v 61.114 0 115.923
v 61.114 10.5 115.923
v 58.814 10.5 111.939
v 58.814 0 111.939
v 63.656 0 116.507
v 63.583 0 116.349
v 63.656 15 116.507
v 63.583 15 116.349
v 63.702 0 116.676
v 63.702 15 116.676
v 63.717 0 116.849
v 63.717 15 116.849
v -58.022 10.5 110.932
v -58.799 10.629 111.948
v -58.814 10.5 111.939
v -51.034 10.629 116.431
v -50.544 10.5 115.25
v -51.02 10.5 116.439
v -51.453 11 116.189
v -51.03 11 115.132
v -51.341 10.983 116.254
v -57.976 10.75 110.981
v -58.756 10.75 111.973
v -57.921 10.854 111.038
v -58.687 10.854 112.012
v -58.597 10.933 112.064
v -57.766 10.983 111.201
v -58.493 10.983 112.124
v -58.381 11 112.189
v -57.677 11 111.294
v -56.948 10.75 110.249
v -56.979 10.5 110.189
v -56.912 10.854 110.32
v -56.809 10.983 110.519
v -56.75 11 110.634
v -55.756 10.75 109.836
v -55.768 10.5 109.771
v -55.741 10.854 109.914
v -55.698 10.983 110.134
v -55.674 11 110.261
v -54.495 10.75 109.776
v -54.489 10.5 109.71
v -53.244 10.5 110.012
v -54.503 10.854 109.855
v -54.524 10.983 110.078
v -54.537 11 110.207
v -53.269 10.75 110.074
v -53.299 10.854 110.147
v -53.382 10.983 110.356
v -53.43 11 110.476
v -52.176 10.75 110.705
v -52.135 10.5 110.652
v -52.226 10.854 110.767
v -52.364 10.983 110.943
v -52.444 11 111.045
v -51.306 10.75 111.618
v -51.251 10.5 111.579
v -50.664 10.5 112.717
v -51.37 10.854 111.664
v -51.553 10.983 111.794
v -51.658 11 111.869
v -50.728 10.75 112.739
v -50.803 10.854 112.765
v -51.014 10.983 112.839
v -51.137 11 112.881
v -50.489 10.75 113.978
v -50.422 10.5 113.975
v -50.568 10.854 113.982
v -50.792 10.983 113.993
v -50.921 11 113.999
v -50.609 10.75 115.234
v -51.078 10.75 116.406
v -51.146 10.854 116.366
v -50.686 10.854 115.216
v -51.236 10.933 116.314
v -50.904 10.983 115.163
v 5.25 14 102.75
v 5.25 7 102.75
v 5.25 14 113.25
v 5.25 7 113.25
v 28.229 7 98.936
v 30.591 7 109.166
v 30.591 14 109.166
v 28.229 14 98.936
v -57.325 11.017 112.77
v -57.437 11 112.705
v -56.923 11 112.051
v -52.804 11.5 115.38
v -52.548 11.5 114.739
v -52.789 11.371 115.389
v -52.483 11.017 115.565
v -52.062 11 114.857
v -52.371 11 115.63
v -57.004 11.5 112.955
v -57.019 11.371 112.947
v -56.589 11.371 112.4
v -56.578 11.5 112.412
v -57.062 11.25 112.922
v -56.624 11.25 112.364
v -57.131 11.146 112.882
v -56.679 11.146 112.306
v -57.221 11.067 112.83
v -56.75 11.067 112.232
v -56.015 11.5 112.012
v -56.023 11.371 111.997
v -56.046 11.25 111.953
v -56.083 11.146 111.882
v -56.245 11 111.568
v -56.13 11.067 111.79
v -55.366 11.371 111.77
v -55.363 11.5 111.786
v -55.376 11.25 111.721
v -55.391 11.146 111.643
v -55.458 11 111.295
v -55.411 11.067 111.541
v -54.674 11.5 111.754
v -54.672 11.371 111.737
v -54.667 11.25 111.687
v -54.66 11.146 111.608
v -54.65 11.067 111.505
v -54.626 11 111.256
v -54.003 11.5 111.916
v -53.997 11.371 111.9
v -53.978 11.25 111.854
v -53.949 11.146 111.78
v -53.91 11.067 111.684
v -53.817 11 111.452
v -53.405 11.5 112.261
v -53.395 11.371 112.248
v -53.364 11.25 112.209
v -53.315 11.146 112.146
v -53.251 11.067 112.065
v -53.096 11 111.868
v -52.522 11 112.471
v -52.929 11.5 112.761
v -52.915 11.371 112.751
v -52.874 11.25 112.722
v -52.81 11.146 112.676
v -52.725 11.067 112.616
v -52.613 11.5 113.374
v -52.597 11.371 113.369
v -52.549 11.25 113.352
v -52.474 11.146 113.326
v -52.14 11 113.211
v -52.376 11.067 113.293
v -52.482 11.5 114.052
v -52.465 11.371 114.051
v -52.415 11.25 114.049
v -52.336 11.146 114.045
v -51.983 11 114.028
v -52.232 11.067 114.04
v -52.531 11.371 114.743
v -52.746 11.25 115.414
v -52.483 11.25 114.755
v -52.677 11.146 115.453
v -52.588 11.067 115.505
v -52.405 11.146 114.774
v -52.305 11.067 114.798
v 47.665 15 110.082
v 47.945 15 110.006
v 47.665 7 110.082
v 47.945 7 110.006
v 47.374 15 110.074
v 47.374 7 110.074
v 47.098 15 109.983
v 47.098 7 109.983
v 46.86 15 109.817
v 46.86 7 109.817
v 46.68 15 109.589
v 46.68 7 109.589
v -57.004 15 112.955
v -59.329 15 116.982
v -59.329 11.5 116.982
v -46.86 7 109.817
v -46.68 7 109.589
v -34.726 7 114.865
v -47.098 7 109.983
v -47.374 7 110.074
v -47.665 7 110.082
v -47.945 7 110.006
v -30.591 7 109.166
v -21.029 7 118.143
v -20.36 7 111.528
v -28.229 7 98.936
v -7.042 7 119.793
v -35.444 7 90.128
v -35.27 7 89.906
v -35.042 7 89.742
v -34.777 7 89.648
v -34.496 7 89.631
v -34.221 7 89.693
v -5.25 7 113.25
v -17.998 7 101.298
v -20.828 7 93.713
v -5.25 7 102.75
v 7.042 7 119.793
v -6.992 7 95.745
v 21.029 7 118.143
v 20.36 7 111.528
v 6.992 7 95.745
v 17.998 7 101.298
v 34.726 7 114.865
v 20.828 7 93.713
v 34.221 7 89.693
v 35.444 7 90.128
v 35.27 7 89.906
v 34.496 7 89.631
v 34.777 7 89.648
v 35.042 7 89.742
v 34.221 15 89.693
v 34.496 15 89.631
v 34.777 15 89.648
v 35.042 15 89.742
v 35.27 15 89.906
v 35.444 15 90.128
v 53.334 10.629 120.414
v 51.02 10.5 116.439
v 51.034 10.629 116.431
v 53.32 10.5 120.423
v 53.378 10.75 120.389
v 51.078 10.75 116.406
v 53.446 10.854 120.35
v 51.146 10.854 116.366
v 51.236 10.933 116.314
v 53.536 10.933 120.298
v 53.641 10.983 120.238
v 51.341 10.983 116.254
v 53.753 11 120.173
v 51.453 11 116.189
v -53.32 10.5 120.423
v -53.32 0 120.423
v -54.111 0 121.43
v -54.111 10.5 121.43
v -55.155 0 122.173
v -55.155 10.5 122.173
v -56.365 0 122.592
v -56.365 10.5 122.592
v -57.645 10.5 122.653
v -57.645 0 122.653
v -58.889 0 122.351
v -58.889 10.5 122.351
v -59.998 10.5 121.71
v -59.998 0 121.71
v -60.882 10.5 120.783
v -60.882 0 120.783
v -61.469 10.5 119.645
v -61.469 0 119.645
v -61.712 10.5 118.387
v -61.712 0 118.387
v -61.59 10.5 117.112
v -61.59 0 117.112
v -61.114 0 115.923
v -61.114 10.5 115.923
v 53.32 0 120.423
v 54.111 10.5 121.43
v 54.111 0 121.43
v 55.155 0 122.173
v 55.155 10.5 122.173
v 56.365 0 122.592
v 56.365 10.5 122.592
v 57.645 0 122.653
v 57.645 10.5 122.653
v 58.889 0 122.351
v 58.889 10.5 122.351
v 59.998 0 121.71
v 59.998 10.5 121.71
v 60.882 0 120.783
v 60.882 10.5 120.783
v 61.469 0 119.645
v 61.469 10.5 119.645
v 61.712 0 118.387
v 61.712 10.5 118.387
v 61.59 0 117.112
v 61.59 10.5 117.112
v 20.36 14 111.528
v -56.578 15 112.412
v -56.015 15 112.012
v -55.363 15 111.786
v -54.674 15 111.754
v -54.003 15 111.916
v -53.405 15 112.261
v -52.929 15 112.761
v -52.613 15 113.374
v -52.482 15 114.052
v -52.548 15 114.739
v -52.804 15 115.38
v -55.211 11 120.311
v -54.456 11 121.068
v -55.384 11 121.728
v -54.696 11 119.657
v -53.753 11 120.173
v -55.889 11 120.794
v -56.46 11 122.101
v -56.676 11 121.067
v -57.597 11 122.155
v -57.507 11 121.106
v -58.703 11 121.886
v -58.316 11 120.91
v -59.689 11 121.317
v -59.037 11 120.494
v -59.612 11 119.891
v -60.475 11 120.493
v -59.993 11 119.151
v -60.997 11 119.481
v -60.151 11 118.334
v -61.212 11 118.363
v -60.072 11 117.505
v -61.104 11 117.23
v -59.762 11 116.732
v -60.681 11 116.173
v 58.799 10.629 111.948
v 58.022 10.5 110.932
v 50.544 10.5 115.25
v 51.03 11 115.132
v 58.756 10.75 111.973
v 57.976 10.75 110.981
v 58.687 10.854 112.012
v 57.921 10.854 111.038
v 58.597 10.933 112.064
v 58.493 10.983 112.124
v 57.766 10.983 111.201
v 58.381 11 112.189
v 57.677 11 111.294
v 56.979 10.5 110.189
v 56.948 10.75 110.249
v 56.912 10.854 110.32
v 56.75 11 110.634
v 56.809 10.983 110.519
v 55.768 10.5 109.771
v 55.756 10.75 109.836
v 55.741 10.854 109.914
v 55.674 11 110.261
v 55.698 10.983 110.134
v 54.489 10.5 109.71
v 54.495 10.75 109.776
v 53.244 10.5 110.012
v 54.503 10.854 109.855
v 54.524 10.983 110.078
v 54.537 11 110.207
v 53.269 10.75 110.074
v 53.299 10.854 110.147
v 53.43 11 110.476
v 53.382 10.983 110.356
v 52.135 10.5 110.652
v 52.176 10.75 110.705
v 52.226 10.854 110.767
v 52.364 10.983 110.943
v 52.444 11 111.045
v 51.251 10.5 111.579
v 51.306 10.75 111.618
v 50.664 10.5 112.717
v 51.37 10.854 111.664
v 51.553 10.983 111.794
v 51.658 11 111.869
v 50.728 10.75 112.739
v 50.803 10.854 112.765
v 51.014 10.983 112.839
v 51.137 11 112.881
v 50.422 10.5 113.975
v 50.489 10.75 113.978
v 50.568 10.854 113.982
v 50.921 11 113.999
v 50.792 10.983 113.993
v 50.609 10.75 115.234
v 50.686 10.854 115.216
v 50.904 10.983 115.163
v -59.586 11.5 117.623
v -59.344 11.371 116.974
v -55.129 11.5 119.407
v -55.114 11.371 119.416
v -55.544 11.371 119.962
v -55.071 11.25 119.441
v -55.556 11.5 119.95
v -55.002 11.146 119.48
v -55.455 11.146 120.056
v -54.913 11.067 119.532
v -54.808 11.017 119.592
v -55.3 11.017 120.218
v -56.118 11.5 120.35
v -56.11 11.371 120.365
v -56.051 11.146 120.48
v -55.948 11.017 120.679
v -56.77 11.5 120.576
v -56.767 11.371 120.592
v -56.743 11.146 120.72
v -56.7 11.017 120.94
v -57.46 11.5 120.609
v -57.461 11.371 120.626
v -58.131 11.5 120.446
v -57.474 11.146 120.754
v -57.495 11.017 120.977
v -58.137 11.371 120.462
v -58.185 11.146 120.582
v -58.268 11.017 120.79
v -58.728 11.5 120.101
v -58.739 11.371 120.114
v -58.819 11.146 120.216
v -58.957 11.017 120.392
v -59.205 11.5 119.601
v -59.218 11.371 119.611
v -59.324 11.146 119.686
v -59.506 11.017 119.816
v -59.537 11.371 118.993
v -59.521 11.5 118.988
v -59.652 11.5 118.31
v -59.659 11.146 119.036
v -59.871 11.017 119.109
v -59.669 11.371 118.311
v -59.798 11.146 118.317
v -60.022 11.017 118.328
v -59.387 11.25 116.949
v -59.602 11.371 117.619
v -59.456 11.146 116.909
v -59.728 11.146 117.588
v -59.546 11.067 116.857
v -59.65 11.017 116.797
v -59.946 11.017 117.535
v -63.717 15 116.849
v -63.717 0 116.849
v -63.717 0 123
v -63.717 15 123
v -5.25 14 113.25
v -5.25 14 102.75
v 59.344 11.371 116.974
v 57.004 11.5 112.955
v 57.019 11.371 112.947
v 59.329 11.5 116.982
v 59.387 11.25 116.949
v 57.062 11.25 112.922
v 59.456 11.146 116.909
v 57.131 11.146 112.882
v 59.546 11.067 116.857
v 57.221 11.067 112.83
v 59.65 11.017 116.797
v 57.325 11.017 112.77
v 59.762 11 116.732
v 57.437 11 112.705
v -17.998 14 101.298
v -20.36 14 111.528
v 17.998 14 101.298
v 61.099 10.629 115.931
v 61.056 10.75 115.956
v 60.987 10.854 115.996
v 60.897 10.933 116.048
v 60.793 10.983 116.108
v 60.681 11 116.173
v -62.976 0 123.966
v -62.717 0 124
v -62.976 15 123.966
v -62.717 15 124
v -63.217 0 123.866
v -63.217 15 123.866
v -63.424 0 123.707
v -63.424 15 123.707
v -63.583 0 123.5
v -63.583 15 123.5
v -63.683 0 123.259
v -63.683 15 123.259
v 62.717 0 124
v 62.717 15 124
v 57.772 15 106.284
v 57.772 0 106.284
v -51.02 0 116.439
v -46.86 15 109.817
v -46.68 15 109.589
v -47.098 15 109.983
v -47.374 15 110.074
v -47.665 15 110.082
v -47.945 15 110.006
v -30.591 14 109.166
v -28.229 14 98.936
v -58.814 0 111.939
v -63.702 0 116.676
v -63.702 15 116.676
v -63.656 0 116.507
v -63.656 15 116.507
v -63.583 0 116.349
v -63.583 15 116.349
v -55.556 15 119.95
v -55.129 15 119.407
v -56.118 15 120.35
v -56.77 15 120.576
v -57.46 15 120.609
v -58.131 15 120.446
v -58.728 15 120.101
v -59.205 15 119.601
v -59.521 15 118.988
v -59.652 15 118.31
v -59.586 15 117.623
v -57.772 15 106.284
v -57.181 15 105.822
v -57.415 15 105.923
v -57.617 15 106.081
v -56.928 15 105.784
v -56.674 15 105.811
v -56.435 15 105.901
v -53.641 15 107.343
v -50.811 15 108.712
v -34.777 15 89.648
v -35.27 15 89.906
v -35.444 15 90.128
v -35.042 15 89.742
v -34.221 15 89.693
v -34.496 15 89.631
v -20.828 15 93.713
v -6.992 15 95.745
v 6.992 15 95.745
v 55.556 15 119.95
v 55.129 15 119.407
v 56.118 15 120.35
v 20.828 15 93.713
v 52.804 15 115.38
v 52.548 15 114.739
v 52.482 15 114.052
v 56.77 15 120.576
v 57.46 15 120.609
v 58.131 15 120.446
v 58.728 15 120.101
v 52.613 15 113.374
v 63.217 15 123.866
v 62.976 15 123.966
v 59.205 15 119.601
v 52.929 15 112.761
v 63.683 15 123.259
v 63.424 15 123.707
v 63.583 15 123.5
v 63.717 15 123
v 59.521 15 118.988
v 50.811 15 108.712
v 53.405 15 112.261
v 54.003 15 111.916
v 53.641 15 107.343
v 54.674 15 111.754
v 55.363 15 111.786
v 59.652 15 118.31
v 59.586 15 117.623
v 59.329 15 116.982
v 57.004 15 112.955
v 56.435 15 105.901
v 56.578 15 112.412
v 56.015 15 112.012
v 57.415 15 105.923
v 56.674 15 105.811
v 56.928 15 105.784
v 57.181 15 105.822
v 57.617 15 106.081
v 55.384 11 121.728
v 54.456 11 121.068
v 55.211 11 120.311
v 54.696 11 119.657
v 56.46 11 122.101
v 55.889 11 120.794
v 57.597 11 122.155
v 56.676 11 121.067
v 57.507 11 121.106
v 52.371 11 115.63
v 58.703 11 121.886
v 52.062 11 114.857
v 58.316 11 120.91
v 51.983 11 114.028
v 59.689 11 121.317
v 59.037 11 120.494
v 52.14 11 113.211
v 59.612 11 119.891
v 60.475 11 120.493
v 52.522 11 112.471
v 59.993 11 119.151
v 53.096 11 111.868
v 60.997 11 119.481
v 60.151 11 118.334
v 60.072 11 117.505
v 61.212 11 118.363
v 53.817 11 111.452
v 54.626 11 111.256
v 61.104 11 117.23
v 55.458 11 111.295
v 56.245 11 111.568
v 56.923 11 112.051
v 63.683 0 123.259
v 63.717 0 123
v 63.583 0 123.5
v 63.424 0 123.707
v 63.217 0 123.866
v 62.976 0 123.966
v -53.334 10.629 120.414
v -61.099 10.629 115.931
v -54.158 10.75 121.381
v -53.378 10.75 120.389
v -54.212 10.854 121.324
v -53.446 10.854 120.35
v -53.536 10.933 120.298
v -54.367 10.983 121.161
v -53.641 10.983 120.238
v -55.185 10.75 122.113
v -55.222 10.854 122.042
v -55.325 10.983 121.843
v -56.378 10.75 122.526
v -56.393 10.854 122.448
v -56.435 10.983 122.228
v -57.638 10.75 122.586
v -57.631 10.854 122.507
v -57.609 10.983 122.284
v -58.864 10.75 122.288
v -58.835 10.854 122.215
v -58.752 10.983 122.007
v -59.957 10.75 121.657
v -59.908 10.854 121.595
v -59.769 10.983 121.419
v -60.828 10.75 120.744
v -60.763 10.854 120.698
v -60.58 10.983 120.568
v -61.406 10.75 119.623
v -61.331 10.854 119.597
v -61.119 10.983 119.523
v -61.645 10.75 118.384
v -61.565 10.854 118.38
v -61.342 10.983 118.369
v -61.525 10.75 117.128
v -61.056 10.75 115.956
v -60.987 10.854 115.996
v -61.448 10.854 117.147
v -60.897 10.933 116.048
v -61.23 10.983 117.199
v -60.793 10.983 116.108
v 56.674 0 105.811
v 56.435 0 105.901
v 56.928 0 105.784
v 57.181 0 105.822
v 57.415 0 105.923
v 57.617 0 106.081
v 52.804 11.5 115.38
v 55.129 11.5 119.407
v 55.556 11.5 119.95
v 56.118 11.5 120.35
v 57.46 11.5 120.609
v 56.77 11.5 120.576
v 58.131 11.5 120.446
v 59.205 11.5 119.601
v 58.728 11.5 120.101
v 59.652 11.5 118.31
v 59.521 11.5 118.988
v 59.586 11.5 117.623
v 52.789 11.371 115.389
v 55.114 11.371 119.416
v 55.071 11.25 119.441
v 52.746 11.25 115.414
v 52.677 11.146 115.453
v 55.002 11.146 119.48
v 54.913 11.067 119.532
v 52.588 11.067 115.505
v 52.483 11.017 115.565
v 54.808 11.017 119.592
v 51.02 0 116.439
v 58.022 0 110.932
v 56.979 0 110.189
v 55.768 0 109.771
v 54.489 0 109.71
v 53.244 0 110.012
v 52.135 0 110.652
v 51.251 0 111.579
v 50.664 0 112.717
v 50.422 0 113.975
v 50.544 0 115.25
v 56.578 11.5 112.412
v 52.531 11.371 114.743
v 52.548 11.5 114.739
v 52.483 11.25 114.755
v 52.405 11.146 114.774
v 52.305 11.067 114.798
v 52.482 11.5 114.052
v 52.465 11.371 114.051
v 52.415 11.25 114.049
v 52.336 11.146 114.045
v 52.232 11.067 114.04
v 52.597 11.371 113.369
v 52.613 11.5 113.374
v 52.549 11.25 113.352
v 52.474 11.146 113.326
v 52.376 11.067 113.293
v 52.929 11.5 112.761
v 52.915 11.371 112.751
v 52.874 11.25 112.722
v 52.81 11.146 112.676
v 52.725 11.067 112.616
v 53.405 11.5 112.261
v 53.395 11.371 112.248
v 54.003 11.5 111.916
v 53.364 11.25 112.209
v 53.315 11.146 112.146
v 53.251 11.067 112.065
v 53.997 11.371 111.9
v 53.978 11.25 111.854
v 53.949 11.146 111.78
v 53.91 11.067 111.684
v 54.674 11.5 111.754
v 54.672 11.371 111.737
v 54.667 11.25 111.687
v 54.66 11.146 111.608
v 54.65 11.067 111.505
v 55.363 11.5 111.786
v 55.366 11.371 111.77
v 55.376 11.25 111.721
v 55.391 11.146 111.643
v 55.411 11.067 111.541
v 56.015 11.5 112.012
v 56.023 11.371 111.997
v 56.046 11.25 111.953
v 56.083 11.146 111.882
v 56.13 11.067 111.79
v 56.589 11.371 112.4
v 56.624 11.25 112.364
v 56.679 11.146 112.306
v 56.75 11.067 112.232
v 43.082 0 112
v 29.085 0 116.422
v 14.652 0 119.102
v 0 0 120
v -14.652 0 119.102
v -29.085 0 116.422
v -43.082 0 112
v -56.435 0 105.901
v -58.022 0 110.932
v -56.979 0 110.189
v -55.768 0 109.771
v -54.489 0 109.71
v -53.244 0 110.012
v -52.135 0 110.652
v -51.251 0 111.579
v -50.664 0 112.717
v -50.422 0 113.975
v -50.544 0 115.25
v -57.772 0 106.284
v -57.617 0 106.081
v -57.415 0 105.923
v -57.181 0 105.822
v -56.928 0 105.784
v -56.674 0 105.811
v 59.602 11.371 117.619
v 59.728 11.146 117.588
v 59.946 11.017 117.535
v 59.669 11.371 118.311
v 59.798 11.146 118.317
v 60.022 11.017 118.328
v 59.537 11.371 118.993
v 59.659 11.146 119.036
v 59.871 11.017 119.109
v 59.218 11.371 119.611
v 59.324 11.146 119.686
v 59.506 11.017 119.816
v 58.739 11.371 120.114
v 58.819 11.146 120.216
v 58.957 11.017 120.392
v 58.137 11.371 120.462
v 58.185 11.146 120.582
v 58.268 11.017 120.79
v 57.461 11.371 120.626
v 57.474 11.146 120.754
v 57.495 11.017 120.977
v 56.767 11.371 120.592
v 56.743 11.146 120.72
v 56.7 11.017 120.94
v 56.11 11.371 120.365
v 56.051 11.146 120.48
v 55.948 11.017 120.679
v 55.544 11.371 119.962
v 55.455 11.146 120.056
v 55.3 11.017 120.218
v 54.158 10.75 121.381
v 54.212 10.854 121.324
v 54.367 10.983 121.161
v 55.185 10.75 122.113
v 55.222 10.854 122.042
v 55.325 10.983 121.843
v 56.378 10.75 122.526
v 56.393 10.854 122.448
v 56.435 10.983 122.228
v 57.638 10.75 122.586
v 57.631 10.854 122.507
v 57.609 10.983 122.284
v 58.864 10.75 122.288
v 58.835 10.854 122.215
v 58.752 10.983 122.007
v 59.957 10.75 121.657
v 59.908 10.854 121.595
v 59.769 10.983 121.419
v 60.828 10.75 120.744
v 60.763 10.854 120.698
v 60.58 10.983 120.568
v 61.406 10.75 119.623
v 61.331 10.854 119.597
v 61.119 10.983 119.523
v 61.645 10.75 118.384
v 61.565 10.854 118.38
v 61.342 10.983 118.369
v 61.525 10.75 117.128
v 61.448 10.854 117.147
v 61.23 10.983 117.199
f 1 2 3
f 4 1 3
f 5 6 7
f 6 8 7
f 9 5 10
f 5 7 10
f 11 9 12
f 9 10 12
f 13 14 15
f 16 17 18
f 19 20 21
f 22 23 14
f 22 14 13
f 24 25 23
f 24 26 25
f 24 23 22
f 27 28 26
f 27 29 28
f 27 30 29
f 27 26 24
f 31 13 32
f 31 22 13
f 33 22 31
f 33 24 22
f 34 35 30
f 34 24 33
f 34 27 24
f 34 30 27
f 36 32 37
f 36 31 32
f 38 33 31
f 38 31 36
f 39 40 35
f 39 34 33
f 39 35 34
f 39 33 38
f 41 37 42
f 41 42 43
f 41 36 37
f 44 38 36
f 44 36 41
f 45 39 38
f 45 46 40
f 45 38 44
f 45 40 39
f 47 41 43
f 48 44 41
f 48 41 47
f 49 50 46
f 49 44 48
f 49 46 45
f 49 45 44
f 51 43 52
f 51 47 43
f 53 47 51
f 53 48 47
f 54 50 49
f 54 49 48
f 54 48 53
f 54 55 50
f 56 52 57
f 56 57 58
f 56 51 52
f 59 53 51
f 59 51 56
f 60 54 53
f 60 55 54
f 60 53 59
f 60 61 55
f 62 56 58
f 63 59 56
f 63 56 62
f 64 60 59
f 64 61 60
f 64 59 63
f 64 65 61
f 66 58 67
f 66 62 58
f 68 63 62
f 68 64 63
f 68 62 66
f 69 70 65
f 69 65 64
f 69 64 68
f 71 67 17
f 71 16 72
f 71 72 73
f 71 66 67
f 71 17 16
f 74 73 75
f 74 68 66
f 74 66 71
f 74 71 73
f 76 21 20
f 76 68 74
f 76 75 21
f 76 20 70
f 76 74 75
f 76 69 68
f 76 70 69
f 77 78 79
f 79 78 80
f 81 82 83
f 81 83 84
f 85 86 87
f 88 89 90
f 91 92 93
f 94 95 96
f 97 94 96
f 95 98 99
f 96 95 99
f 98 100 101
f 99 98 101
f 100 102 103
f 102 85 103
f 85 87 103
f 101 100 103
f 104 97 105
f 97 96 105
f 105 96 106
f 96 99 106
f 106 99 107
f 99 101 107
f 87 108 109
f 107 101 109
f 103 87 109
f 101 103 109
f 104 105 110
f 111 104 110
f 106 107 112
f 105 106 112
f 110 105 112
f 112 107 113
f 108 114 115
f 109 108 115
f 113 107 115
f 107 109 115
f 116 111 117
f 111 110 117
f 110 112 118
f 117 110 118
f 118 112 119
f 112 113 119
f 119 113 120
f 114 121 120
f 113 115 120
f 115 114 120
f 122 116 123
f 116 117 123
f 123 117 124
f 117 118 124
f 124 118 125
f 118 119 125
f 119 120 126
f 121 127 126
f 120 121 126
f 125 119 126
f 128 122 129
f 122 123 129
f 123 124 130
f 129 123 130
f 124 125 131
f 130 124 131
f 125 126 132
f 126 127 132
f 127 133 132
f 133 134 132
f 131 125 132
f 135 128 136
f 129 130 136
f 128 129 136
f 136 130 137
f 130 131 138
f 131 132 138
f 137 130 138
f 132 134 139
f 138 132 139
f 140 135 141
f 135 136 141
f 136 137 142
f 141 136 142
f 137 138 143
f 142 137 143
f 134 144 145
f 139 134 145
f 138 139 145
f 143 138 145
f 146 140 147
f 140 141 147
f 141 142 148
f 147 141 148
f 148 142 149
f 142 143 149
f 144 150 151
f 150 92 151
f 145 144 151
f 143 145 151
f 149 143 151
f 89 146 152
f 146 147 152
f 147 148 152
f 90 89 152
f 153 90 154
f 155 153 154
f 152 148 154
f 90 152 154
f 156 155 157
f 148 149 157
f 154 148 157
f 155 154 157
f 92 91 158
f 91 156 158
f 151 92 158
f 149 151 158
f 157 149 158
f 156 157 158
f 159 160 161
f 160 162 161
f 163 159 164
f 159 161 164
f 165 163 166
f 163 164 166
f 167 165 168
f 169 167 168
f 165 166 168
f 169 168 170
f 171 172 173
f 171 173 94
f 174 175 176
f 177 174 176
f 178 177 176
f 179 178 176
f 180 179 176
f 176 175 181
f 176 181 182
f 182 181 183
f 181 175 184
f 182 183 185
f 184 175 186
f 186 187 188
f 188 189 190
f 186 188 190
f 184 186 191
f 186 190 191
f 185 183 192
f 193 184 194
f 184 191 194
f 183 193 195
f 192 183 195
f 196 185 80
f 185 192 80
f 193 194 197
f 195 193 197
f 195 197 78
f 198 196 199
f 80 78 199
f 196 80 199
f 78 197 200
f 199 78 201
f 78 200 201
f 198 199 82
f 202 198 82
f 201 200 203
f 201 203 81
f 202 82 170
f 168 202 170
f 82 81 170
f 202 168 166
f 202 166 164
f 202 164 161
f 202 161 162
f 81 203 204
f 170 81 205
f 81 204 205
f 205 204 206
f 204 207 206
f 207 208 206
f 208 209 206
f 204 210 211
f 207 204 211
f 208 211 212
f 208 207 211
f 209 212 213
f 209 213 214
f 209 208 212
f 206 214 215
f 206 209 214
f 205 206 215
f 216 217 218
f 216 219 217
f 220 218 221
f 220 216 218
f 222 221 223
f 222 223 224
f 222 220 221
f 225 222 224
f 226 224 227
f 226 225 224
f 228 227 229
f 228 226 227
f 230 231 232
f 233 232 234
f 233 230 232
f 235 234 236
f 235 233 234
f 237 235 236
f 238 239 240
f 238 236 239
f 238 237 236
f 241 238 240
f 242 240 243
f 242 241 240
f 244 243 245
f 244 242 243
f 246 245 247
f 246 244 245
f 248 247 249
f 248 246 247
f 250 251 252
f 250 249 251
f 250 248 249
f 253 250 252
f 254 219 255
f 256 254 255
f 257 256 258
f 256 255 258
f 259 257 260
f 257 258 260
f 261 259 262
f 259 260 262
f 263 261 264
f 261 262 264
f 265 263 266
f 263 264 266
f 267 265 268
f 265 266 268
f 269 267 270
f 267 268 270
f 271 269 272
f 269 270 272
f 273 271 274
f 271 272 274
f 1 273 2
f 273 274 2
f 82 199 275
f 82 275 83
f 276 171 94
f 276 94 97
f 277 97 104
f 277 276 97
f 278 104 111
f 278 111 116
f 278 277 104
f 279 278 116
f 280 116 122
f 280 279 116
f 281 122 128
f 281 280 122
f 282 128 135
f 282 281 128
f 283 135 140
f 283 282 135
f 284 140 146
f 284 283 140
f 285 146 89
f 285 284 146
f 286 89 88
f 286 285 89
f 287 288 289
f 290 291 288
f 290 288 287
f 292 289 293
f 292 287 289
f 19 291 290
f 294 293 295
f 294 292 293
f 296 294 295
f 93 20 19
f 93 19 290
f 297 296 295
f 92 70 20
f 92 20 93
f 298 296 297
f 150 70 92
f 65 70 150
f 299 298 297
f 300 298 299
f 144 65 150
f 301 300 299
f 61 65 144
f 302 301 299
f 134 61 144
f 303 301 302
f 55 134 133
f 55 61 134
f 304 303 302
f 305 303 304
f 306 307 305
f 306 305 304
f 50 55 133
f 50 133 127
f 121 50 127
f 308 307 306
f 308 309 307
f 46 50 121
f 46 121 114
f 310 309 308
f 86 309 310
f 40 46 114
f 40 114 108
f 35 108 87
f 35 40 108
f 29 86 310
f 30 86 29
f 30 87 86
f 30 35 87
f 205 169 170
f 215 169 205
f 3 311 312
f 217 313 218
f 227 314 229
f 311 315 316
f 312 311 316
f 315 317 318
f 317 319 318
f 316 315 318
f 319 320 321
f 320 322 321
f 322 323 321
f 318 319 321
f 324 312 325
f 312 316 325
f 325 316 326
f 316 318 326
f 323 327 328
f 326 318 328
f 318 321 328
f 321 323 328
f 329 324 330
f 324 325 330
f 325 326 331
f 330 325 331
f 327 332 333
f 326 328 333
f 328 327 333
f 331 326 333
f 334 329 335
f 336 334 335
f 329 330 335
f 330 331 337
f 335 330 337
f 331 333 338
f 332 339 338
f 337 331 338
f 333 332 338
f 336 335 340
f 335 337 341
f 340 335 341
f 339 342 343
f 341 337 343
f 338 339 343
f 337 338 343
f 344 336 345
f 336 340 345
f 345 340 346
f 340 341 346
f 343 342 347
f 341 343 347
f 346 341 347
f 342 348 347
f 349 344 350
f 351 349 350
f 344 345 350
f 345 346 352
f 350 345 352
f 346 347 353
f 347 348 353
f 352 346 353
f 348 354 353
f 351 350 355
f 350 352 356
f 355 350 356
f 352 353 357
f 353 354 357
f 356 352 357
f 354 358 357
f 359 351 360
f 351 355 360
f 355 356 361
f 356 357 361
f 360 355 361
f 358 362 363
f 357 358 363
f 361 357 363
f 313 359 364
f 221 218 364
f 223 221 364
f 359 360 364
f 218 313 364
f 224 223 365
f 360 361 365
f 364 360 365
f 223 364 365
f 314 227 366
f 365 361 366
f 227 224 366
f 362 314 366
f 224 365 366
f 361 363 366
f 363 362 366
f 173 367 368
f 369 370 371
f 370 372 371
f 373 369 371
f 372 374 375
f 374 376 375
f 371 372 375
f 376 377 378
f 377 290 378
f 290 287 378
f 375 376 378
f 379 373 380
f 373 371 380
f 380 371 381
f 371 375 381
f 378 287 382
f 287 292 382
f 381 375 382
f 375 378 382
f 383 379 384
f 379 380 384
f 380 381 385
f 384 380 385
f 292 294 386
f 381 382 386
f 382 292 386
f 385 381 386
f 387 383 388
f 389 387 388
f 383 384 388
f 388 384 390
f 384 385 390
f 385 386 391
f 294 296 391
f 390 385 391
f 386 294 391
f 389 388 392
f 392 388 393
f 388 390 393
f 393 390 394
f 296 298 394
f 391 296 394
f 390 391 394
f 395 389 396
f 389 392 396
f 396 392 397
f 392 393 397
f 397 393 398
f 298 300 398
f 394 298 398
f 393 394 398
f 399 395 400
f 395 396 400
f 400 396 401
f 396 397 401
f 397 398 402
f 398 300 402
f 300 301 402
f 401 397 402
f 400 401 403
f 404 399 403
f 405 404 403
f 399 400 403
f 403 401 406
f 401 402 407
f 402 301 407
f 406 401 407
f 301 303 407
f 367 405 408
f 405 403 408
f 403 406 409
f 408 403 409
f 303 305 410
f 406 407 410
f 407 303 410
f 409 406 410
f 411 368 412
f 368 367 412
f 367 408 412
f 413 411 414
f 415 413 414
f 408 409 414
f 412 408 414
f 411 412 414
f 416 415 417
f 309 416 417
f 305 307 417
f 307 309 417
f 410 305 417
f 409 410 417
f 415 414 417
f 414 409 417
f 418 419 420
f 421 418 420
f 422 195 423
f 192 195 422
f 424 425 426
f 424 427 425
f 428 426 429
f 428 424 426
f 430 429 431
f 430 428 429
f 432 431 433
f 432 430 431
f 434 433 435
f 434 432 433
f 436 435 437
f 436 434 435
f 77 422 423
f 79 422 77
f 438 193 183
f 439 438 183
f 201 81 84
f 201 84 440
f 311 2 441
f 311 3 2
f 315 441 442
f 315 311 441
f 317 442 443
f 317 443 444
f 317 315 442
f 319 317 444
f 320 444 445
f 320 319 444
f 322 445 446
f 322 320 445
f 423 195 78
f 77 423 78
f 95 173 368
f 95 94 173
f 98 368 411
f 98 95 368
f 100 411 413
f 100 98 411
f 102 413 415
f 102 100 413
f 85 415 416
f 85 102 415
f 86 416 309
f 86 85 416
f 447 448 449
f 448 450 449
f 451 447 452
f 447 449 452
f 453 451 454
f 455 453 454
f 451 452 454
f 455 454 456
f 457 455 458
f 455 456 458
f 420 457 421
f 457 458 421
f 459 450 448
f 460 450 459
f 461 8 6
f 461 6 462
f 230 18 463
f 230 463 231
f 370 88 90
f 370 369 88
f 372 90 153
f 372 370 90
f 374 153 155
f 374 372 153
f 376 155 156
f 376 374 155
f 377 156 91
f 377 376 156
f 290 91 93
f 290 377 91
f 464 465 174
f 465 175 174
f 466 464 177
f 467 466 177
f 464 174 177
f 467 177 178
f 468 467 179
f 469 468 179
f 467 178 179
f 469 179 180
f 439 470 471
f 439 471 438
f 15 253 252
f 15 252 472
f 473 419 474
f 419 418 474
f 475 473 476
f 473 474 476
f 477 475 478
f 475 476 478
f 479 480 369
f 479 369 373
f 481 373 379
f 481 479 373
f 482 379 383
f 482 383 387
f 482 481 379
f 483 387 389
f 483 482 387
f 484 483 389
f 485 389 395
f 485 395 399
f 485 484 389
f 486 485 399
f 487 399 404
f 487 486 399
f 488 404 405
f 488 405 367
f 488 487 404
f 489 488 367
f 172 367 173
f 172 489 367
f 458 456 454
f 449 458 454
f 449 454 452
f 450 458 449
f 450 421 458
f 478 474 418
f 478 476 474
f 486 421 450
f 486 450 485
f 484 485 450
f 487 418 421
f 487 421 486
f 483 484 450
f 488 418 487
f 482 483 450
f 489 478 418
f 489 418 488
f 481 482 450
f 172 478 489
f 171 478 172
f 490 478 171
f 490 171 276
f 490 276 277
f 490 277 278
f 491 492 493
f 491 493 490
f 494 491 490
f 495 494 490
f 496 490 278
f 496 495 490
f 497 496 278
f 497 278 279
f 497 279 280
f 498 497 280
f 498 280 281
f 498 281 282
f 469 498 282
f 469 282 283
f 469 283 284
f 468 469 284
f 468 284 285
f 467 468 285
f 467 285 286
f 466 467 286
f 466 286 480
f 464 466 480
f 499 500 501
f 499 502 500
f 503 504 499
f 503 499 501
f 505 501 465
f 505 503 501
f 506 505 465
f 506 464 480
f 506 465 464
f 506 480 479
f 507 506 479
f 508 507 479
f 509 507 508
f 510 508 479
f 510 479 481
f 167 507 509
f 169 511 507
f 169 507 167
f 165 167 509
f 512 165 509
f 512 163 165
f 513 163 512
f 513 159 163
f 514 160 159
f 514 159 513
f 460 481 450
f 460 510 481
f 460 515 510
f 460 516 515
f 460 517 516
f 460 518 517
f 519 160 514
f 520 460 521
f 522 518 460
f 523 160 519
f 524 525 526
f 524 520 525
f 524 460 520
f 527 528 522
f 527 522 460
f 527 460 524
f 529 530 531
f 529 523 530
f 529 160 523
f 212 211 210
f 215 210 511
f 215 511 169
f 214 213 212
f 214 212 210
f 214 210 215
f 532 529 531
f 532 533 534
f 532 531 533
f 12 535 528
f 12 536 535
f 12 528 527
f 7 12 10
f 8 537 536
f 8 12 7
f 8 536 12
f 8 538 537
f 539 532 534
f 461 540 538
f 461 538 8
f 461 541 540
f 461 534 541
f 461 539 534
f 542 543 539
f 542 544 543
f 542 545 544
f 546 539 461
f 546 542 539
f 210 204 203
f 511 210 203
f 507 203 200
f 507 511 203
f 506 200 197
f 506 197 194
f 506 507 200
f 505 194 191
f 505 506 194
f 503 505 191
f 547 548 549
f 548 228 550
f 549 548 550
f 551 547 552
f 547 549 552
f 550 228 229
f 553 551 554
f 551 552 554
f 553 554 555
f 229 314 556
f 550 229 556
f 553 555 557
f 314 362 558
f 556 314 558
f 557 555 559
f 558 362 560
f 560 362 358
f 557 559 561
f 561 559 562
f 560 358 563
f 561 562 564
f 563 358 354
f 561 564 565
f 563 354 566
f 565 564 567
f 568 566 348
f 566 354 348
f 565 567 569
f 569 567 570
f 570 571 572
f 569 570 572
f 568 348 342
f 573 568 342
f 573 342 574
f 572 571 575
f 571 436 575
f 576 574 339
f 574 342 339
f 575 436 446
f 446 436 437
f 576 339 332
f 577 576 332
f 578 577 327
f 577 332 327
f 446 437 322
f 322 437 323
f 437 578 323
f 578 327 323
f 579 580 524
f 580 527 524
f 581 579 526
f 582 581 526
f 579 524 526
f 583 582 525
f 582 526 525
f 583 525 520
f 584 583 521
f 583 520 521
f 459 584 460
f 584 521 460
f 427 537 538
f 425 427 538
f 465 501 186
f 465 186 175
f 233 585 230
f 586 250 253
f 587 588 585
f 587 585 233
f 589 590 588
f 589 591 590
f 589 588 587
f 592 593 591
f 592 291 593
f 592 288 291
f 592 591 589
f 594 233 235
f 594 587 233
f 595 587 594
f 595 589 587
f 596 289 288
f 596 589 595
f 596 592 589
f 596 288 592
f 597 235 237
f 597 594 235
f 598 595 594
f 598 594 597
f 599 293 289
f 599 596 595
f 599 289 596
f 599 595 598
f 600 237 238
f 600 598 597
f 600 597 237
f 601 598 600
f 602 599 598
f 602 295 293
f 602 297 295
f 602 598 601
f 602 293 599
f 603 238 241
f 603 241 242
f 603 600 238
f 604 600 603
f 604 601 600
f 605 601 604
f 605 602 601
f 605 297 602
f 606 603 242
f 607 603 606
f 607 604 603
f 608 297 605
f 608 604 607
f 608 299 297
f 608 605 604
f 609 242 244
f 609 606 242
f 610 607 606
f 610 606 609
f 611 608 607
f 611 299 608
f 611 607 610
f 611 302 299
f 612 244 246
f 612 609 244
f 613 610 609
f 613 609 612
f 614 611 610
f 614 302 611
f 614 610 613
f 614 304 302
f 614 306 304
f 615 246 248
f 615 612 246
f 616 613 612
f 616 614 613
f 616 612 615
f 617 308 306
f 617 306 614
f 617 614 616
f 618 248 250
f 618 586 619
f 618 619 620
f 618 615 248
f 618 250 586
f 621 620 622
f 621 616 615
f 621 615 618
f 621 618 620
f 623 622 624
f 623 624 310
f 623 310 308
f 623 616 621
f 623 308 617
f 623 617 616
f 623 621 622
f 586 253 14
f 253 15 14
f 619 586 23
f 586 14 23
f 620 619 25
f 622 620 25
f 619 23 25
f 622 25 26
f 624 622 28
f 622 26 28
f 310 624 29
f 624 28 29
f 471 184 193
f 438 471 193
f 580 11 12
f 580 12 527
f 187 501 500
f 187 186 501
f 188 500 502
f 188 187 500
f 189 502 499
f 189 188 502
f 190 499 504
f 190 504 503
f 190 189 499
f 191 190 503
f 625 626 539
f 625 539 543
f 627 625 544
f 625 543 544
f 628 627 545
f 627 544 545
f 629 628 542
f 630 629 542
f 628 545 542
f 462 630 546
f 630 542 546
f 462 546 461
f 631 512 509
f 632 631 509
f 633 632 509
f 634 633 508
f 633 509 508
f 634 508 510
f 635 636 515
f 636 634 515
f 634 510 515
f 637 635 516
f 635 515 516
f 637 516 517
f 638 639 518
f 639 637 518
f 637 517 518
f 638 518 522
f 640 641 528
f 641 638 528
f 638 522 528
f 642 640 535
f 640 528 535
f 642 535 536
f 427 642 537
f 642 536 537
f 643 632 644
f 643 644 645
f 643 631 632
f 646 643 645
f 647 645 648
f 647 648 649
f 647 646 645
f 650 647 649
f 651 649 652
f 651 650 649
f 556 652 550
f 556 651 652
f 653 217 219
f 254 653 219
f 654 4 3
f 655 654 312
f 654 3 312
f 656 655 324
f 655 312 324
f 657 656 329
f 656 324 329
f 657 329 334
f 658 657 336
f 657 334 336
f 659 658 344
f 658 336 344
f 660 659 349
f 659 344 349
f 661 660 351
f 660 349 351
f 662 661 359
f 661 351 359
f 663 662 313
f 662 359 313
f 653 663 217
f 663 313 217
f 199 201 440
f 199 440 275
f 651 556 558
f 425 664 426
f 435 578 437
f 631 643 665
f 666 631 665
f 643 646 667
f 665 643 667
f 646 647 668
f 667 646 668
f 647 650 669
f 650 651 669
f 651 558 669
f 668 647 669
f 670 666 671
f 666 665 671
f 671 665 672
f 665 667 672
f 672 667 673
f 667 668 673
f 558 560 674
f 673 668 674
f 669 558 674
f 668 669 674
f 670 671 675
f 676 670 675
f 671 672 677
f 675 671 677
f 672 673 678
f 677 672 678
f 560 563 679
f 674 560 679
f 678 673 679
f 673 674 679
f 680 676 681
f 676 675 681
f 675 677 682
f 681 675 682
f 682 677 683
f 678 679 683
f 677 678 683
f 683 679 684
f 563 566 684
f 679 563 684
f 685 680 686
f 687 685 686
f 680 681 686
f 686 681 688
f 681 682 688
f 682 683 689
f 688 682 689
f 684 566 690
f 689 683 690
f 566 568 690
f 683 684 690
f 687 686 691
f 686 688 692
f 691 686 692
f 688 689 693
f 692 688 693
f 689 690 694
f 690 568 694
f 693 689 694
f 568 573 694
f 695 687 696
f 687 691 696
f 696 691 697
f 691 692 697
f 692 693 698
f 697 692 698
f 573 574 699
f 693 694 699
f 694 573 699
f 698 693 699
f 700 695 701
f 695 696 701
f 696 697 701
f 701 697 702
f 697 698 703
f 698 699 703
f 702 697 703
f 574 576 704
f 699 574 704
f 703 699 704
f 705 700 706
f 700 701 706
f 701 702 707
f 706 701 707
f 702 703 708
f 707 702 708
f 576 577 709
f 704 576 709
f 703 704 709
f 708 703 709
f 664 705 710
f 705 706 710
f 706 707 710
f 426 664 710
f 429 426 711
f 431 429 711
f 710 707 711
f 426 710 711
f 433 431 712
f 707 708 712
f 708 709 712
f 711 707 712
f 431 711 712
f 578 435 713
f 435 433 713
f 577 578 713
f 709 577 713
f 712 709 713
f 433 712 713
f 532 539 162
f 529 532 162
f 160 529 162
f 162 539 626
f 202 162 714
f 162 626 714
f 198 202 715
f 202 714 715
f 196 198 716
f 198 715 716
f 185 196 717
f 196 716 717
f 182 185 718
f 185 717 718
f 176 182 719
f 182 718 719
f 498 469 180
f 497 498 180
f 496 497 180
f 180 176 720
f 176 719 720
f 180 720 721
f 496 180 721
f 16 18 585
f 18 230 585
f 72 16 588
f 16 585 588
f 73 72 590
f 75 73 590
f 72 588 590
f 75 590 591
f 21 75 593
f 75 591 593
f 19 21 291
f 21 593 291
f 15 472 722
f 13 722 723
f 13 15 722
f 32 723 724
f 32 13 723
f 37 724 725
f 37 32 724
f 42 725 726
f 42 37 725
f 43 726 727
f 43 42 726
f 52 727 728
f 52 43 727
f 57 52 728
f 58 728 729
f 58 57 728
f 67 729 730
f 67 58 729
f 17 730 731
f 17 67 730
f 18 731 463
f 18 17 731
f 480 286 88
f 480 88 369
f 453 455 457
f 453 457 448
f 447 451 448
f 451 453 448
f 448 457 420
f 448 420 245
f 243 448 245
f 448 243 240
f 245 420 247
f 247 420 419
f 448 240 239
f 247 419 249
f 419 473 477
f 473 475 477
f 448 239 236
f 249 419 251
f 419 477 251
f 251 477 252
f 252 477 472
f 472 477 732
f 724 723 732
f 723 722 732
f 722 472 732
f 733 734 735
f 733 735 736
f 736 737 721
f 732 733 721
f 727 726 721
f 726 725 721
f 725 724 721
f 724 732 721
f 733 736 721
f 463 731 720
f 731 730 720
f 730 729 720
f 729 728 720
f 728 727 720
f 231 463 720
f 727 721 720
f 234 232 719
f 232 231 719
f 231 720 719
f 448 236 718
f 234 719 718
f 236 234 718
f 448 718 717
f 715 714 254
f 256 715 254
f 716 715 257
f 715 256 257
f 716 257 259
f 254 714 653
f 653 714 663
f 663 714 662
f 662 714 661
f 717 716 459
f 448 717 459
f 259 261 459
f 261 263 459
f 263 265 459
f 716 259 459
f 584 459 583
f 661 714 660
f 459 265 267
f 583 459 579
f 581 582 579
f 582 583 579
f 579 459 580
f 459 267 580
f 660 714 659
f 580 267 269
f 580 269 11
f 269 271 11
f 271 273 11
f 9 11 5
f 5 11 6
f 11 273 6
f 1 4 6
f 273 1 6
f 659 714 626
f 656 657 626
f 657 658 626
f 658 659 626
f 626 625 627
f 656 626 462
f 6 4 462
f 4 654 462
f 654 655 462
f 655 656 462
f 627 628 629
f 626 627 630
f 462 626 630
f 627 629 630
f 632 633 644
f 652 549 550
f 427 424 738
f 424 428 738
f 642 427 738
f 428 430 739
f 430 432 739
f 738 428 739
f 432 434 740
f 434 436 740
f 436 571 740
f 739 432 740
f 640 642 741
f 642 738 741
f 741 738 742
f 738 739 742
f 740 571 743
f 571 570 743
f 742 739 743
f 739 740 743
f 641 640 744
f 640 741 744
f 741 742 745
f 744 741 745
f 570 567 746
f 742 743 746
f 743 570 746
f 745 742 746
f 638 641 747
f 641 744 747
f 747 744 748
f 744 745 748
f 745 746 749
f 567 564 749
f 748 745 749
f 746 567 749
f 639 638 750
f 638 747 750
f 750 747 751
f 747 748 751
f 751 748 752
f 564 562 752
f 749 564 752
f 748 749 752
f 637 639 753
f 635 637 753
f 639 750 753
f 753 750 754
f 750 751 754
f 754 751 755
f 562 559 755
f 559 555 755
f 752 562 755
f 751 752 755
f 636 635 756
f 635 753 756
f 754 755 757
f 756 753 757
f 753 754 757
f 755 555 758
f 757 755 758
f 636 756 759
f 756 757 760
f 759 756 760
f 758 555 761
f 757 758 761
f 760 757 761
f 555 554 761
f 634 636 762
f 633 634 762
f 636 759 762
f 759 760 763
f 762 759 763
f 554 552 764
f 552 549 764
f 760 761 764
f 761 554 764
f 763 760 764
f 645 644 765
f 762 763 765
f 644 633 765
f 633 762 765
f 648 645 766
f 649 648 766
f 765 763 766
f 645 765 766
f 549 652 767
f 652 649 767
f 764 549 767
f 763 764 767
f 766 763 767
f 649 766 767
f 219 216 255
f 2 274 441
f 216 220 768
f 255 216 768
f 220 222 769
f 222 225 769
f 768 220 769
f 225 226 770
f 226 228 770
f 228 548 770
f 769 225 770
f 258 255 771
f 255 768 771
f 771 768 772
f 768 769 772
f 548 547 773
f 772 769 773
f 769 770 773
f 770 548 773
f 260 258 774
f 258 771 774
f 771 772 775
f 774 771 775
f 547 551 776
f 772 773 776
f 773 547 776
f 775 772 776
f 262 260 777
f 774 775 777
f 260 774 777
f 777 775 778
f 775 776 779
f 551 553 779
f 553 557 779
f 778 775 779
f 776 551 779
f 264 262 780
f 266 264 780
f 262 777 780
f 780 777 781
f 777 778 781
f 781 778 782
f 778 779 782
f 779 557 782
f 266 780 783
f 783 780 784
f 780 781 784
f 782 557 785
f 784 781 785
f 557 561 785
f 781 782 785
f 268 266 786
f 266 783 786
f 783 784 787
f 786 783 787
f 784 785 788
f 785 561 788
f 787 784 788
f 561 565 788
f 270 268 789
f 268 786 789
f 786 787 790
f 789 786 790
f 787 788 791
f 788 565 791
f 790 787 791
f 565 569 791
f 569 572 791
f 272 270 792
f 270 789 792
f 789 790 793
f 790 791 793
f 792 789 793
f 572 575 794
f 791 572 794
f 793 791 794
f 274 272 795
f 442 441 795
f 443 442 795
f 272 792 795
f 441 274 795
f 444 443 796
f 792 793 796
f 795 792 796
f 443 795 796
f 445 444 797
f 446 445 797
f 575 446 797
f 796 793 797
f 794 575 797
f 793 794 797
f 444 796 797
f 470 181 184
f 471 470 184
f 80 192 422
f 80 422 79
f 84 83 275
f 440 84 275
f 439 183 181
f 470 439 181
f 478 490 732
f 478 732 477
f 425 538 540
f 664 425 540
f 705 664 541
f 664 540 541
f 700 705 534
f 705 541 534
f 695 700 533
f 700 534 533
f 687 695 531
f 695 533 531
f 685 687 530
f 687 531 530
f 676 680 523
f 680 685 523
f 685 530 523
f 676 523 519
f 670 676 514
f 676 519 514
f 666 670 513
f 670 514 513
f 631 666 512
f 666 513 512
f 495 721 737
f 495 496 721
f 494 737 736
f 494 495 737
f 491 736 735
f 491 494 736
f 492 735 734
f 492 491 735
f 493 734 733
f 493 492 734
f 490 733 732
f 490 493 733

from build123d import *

# Parameters (mm, degrees)
BOSS_EXTRUDE1_DEPTH = 15
CUT_EXTRUDE1_DEPTH  = 16
CUT_EXTRUDE3_START  = -4
CUT_EXTRUDE3_DEPTH  = 12
FILLET2_R           = 0.5
BOSS_EXTRUDE2_DEPTH = 8
SKETCH5_W           = 10.5
SKETCH5_H           = 10.5
CUT_EXTRUDE4_DEPTH  = 7
CUT_EXTRUDE5_DEPTH  = 16
FILLET1_R           = 1


with BuildPart() as part:
    # Sketch1 → Boss-Extrude1 (new body)
    with BuildSketch(Plane(origin=(0, 0, 0), x_dir=(1, 0, 0), z_dir=(0, 1, 0))):
        with BuildLine():
            Line((-57.286267839, -105.443271559), (-68, -124))
            Line((-68, -124), (68, -124))
            Line((68, -124), (57.286267839, -105.443271559))
            ThreePointArc((57.286267839, -105.443271559), (0, -120), (-57.286267839, -105.443271559))
        make_face()
    extrude(amount=BOSS_EXTRUDE1_DEPTH)

    # Sketch2 → Cut-Extrude1 (cut, through all)
    with BuildSketch(Plane(origin=(0, 15, 0), x_dir=(1, 0, 0), z_dir=(0, 1, 0))):
        with BuildLine():
            Line((-52.804159001, -115.380031326), (-55.129159001, -119.407049454))
            ThreePointArc((-55.129159001, -119.407049454), (-58.441770605, -120.294661058), (-59.32938221, -116.982049454))
            Line((-59.32938221, -116.982049454), (-57.00438221, -112.955031326))
            ThreePointArc((-57.00438221, -112.955031326), (-53.691770605, -112.067419722), (-52.804159001, -115.380031326))
        make_face()
        with BuildLine():
            Line((52.804159001, -115.380031326), (55.129159001, -119.407049454))
            ThreePointArc((55.129159001, -119.407049454), (58.441770605, -120.294661058), (59.32938221, -116.982049454))
            Line((59.32938221, -116.982049454), (57.00438221, -112.955031326))
            ThreePointArc((57.00438221, -112.955031326), (53.691770605, -112.067419722), (52.804159001, -115.380031326))
        make_face()
    extrude(amount=-CUT_EXTRUDE1_DEPTH, mode=Mode.SUBTRACT)

    # Sketch3 → Cut-Extrude3 (cut, through all)
    with BuildSketch(Plane(origin=(0, 15, 0), x_dir=(1, 0, 0), z_dir=(0, 1, 0)).offset(CUT_EXTRUDE3_START)):
        with BuildLine():
            Line((-51.019656288, -116.439181962), (-53.319656288, -120.422898819))
            ThreePointArc((-53.319656288, -120.422898819), (-59.466770605, -122.070013136), (-61.113884922, -115.922898819))
            Line((-61.113884922, -115.922898819), (-58.813884922, -111.939181962))
            ThreePointArc((-58.813884922, -111.939181962), (-52.666770605, -110.292067644), (-51.019656288, -116.439181962))
        make_face()
        with BuildLine():
            Line((51.019656288, -116.439181962), (53.319656288, -120.422898819))
            ThreePointArc((53.319656288, -120.422898819), (59.466770605, -122.070013136), (61.113884922, -115.922898819))
            Line((61.113884922, -115.922898819), (58.813884922, -111.939181962))
            ThreePointArc((58.813884922, -111.939181962), (52.666770605, -110.292067644), (51.019656288, -116.439181962))
        make_face()
    extrude(amount=-CUT_EXTRUDE3_DEPTH, mode=Mode.SUBTRACT)

    # Fillet2
    fillet2_edges = [part.edges().sort_by_distance(p)[0] for p in [
        (-58.16688221, 11, 114.96854039),
        (53.966659001, 11, 117.39354039),
        (-52.666770605, 11, 110.292067644),
        (-59.963884922, 11, 113.93104039),
        (-59.466770605, 11, 122.070013136),
        (-52.169656288, 11, 118.43104039),
        (-53.691770605, 11, 112.067419722),
        (-53.966659001, 11, 117.39354039),
        (-58.441770605, 11, 120.294661058),
        (52.666770605, 11, 110.292067644),
        (52.169656288, 11, 118.43104039),
        (59.466770605, 11, 122.070013136),
        (59.963884922, 11, 113.93104039),
        (58.16688221, 11, 114.96854039),
        (53.691770605, 11, 112.067419722),
        (58.441770605, 11, 120.294661058),
    ]]
    fillet(fillet2_edges, radius=FILLET2_R)

    # Sketch4 → Boss-Extrude2 (add)
    with BuildSketch(Plane(origin=(0, 15, 0), x_dir=(1, 0, 0), z_dir=(0, 1, 0))):
        with BuildLine():
            Line((-35.015731887, -89.386232276), (-55, -124))
            Line((-55, -124), (55, -124))
            Line((55, -124), (35.015731887, -89.386232276))
            ThreePointArc((35.015731887, -89.386232276), (0, -96), (-35.015731887, -89.386232276))
        make_face()
    extrude(amount=-BOSS_EXTRUDE2_DEPTH)

    # Sketch5 → Cut-Extrude4 (cut)
    with BuildSketch(Plane.XZ.offset(-7)):
        with Locations((0, 108)):
            Rectangle(SKETCH5_W, SKETCH5_H)
        Polygon((17.998277994, 101.297517192), (20.360264064, 111.528402872), (30.591149745, 109.166416802), (28.229163674, 98.935531121), align=None)
        Polygon((-17.998277994, 101.297517192), (-20.360264064, 111.528402872), (-30.591149745, 109.166416802), (-28.229163674, 98.935531121), align=None)
    extrude(amount=-CUT_EXTRUDE4_DEPTH, mode=Mode.SUBTRACT)

    # Sketch6 → Cut-Extrude5 (cut, through all)
    with BuildSketch(Plane.XZ):
        Polygon((63.716770605, 116.581229068), (63.716770605, 124), (68, 124), align=None)
        Polygon((-68, 124), (-63.716770605, 116.581229068), (-63.716770605, 124), align=None)
    extrude(amount=-CUT_EXTRUDE5_DEPTH, mode=Mode.SUBTRACT)

    # Fillet1
    fillet1_edges = [part.edges().sort_by_distance(p)[0] for p in [
        (35.015731887, 11, 89.386232276),
        (-35.015731887, 11, 89.386232276),
        (47.124753912, 11, 110.359673653),
        (-47.124753912, 11, 110.359673653),
        (63.716770605, 7.5, 116.581229068),
        (63.716770605, 7.5, 124),
        (-63.716770605, 7.5, 124),
        (-63.716770605, 7.5, 116.581229068),
        (57.286267839, 7.5, 105.443271559),
        (-57.286267839, 7.5, 105.443271559),
    ]]
    fillet(fillet1_edges, radius=FILLET1_R)


solid = part.part
